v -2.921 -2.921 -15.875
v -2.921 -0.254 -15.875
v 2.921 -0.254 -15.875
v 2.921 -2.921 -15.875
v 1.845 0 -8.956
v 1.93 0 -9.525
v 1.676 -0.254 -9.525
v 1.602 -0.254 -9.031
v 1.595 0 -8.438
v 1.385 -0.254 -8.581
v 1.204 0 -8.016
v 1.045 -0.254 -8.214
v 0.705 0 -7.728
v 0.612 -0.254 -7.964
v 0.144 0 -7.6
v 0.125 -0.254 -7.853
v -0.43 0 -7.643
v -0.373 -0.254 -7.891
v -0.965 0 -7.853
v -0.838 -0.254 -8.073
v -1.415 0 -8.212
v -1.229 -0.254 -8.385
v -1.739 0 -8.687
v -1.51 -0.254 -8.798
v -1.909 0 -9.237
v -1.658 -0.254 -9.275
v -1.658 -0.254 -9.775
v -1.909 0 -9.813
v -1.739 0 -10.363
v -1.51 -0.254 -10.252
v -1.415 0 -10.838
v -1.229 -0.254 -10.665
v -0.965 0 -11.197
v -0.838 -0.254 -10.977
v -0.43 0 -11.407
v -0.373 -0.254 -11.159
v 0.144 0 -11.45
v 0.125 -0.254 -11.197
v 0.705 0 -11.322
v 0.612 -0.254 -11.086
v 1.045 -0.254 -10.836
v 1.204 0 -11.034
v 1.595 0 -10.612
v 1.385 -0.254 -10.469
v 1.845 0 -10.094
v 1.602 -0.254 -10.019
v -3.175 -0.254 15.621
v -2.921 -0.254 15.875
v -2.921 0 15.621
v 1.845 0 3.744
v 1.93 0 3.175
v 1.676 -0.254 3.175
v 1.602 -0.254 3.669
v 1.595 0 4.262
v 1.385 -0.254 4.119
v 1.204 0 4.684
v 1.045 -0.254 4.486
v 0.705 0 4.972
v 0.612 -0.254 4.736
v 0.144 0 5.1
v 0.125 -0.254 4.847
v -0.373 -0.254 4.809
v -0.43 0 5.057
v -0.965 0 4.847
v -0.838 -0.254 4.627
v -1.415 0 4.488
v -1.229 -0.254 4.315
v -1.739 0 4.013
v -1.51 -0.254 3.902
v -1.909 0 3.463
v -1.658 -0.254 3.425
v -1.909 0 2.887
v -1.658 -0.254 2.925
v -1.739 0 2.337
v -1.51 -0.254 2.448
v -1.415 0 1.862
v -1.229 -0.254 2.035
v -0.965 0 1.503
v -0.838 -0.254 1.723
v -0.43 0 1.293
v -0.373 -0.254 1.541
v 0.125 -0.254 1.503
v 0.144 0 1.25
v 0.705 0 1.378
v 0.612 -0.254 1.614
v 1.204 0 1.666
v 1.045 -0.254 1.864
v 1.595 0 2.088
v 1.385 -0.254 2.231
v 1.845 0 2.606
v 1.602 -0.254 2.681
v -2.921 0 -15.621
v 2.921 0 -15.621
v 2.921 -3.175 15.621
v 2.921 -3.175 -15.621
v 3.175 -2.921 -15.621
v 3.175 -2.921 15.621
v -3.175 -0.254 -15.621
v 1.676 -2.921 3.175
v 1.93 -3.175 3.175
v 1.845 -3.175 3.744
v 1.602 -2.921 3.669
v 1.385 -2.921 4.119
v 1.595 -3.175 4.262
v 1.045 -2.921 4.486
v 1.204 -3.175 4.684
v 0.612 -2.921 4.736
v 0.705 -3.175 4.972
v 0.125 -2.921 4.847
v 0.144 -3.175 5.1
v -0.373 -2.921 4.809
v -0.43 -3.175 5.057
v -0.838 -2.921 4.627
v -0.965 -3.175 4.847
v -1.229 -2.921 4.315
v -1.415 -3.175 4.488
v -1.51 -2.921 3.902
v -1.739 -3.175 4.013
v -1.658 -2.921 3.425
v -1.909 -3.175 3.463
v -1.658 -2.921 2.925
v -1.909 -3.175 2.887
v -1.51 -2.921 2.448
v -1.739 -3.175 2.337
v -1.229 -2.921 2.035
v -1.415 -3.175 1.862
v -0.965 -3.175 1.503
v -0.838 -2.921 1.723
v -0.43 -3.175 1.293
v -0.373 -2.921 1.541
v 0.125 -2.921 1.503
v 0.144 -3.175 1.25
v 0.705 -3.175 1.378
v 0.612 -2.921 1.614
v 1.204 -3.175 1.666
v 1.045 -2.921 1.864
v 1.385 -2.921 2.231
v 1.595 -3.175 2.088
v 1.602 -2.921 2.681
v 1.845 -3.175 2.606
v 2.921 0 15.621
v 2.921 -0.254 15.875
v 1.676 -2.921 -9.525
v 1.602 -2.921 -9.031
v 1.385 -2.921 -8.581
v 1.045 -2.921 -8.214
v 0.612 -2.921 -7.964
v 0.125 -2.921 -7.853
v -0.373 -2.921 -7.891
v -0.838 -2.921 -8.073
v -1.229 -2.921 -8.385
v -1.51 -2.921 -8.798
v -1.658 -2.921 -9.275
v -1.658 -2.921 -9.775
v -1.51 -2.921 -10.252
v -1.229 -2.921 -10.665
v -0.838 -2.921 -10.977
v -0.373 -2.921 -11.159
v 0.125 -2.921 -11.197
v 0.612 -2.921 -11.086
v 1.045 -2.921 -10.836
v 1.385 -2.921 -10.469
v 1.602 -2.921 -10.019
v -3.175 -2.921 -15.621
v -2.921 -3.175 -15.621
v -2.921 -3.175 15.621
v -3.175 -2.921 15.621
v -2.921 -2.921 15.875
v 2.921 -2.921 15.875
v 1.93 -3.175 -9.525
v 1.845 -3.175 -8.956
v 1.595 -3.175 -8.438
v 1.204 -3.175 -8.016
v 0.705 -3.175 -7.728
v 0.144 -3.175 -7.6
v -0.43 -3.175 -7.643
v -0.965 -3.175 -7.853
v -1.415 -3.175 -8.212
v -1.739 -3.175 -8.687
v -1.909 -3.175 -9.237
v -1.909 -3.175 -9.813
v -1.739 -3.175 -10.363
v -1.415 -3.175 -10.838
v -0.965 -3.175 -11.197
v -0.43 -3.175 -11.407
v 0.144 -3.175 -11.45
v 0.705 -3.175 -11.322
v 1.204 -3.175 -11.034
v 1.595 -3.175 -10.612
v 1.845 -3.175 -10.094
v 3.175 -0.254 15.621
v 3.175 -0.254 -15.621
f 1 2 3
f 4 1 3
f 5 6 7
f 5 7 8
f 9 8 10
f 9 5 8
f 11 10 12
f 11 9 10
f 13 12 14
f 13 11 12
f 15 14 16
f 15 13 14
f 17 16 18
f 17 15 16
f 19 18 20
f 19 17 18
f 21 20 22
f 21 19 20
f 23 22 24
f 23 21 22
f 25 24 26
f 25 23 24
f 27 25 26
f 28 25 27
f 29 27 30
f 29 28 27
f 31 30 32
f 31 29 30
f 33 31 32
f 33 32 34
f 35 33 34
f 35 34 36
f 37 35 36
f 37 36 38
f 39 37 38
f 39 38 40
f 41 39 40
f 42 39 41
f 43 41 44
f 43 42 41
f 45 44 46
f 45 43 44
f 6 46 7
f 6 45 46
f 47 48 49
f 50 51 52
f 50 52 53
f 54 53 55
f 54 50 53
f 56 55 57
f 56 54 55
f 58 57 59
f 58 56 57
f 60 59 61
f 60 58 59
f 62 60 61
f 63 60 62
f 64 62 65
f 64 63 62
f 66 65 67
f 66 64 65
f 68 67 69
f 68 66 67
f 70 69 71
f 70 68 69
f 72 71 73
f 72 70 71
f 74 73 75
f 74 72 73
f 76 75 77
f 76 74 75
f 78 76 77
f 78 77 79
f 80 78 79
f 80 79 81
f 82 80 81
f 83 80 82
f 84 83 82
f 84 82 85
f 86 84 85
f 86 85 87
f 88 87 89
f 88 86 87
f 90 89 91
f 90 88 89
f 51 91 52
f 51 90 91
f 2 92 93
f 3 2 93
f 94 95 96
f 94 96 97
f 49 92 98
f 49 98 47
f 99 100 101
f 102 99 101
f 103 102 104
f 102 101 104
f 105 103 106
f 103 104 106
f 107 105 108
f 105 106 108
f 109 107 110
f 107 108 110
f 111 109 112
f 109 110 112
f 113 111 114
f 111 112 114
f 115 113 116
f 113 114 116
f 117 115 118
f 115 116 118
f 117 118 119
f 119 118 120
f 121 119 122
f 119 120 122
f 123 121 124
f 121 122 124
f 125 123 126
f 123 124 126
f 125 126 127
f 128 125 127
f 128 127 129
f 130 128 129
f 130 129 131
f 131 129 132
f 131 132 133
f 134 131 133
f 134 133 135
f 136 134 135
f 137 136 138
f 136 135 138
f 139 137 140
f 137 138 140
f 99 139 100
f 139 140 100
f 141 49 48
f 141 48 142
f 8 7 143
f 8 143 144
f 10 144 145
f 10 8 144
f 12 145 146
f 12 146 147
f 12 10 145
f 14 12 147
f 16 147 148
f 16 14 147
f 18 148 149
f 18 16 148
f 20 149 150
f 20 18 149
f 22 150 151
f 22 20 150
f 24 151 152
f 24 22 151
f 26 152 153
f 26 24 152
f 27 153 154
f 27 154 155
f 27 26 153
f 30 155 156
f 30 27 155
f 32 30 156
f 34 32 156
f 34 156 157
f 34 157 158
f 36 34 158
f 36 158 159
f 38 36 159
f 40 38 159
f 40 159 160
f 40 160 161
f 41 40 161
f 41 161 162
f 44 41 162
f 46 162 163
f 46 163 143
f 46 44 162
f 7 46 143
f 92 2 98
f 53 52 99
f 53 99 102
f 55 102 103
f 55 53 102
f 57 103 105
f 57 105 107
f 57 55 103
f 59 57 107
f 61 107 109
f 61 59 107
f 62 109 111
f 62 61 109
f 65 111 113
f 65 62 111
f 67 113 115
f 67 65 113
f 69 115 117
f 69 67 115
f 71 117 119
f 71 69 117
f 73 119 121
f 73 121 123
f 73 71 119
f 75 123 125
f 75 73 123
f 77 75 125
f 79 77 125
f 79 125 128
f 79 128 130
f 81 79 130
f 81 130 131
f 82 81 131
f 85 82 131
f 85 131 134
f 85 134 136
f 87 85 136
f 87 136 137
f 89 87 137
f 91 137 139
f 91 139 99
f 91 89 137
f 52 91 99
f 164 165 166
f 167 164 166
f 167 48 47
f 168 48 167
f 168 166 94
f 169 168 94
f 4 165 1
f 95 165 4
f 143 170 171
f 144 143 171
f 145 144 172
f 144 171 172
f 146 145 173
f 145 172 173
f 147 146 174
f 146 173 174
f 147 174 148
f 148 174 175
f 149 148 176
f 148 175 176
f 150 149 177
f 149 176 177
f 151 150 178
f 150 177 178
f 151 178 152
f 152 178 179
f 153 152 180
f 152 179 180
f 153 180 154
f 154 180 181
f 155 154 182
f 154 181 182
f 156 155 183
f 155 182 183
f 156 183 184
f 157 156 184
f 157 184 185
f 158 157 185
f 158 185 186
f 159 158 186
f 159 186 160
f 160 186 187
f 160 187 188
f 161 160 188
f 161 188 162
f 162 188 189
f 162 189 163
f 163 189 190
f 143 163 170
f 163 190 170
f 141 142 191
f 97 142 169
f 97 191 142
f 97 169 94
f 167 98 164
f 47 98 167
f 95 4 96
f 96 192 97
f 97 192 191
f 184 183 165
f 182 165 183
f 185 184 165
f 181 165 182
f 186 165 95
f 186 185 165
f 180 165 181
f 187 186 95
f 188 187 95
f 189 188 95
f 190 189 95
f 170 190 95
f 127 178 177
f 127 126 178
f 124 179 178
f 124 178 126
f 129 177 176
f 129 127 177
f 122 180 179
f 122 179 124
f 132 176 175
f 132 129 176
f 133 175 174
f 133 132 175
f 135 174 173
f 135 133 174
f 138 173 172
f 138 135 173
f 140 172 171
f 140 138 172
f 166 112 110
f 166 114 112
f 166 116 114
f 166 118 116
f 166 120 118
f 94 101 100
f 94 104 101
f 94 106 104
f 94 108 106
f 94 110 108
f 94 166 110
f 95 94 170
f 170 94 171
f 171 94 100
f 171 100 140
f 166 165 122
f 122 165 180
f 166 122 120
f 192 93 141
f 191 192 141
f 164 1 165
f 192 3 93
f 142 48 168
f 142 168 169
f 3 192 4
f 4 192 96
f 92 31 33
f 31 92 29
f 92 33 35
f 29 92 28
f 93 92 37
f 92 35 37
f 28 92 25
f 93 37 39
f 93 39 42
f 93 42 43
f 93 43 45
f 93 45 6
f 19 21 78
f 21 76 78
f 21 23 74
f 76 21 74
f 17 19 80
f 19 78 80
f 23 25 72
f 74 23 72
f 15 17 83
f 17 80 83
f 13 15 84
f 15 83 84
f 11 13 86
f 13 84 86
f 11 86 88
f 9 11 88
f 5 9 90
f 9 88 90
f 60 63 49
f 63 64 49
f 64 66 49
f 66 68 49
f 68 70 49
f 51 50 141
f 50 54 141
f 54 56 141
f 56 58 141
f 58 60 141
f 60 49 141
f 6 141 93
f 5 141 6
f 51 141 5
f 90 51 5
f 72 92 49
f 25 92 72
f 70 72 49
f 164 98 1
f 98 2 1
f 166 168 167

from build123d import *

# Parameters (mm, degrees)
F0_W     = 6.35
F0_H     = 31.75
F0_R     = 1.6764
F1_DEPTH = 3.175
F2_SIZE  = 0.254


with BuildPart() as f1:
    # F0 (on Front) → F1 (new body)
    with BuildSketch(Plane.XZ):
        Rectangle(F0_W, F0_H)
        with Locations((0, -9.525)):
            Circle(F0_R, mode=Mode.SUBTRACT)
        with Locations((0, 3.175)):
            Circle(F0_R, mode=Mode.SUBTRACT)
    extrude(amount=F1_DEPTH)

    # F2
    f2_edges = [f1.edges().sort_by_distance(p)[0] for p in [
        (-1.6764, -3.175, 3.175),
        (-1.6764, -3.175, -9.525),
        (3.175, -1.5875, -15.875),
        (-3.175, -1.5875, 15.875),
        (3.175, -1.5875, 15.875),
        (-1.6764, 0, -9.525),
        (-3.175, -1.5875, -15.875),
        (0, 0, -15.875),
        (0, -3.175, -15.875),
        (0, 0, 15.875),
        (0, -3.175, 15.875),
        (-3.175, 0, 0),
        (-3.175, -3.175, 0),
        (3.175, 0, 0),
        (3.175, -3.175, 0),
        (-1.6764, 0, 3.175),
    ]]
    chamfer(f2_edges, length=F2_SIZE)


solid = f1.part
